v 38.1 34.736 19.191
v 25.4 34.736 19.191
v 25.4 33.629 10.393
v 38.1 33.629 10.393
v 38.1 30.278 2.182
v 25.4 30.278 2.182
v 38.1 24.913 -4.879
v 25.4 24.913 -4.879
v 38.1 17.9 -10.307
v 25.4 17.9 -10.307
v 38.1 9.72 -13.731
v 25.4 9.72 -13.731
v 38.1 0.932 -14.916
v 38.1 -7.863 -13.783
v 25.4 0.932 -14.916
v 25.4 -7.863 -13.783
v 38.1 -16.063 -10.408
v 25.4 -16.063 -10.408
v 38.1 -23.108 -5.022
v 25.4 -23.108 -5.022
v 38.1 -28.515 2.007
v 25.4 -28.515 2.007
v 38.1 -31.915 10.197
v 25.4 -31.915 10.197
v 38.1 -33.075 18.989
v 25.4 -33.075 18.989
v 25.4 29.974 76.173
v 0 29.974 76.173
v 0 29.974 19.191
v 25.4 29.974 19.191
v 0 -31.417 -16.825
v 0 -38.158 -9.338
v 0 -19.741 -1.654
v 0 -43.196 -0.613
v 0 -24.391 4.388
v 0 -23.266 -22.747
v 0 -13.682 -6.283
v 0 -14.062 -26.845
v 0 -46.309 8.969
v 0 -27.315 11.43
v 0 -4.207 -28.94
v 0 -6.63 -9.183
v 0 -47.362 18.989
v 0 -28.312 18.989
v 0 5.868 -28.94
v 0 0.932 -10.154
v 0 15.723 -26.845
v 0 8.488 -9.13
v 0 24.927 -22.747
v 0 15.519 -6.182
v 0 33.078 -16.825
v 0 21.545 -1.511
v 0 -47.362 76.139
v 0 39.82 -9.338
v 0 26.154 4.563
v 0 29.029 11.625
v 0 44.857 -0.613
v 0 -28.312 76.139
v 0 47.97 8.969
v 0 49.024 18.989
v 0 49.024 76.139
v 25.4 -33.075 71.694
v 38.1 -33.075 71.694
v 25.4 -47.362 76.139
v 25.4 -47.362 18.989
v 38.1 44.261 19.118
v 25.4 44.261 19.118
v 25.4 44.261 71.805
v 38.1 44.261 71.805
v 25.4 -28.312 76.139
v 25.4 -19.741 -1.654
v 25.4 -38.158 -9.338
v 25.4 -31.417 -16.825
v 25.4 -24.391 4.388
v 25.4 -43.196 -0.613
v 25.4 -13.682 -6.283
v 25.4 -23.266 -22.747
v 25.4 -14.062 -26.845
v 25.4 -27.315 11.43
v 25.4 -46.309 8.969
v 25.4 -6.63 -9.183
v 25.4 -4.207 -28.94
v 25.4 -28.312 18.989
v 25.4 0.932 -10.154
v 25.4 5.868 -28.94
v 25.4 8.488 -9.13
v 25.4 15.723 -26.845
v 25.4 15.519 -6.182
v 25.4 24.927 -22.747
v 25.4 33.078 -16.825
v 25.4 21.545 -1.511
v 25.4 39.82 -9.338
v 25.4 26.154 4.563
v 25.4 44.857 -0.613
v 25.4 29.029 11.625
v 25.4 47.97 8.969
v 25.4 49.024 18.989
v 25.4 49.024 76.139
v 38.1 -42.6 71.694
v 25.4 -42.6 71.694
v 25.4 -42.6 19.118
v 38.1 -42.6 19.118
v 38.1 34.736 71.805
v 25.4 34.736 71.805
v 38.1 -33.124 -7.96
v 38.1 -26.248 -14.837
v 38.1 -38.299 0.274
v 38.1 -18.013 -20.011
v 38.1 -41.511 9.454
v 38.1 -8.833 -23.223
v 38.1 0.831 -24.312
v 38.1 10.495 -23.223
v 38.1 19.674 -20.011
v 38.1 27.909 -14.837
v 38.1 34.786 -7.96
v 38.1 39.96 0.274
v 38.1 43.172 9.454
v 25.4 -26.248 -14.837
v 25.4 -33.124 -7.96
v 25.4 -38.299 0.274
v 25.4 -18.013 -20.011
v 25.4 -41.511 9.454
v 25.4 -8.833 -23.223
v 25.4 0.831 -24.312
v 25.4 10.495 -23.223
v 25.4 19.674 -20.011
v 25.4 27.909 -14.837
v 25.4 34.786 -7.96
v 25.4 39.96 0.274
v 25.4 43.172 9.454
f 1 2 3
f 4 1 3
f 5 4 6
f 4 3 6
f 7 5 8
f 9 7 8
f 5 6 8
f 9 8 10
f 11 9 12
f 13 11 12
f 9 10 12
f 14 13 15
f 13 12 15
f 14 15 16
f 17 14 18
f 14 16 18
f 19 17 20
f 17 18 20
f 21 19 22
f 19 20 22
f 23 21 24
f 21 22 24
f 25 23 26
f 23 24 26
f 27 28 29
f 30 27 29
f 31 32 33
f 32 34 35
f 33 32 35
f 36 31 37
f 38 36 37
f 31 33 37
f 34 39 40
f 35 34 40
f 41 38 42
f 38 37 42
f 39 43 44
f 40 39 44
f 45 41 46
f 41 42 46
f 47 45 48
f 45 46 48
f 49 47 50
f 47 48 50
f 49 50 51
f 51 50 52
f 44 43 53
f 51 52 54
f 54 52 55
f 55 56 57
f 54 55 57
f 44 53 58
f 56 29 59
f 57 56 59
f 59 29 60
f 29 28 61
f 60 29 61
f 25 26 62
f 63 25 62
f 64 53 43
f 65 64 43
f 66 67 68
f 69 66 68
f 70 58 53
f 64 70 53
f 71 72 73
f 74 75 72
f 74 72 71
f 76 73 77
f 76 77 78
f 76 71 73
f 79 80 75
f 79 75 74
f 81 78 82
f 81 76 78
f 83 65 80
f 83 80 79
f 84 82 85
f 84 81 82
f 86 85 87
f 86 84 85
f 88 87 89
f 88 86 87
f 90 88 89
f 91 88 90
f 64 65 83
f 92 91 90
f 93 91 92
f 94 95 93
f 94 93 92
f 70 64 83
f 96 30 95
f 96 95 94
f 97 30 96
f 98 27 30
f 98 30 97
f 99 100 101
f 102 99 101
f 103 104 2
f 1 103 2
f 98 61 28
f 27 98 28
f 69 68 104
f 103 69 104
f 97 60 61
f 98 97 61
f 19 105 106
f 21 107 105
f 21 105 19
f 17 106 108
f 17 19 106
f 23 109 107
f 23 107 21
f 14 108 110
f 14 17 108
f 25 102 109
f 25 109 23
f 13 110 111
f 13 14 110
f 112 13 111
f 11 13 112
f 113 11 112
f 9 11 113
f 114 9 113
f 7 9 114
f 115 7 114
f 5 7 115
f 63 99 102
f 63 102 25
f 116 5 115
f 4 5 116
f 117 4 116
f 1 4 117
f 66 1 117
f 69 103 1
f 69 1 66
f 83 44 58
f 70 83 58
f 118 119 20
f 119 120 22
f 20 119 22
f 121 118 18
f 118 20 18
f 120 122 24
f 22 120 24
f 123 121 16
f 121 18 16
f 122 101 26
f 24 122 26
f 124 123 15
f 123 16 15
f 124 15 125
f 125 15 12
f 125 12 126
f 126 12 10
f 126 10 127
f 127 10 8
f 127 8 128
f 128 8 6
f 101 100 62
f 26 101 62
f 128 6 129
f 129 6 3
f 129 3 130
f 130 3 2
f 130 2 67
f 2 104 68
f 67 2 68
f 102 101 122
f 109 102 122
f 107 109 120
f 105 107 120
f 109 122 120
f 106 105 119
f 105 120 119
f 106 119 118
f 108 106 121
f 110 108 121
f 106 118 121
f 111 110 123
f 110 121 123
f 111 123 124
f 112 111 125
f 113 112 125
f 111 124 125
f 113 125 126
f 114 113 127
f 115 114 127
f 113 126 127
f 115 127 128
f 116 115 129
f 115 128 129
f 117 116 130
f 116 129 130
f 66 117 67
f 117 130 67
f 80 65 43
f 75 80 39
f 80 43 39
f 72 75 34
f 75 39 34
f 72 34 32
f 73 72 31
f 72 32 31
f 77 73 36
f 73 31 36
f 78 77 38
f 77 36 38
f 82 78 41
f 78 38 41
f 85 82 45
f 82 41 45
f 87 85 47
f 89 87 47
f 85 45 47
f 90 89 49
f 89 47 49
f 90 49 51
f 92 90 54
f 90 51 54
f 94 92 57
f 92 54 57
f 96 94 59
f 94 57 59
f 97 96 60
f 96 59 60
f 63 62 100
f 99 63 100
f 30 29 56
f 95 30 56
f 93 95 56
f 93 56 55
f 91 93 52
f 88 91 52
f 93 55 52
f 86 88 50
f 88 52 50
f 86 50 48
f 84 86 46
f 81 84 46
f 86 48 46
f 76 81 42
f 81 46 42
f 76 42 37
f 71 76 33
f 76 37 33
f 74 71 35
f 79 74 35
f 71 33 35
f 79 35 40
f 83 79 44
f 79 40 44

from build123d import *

# Parameters (mm, degrees)
F1_DEPTH = 25.4
F3_DEPTH = 12.7


# Not quite as in the source:
# - ends of sketch curves that miss each other by under 0.0002 mm in the source are joined


with BuildPart() as f1:
    # F0 (on Right) → F1 (new body)
    with BuildSketch(Plane.YZ):
        with BuildLine():
            Line((-28.3121045191, 76.1390224734), (-47.3621045191, 76.1390224734))
            Line((-47.3621045191, 76.1390224734), (-47.3621045191, 18.9890224734))
            ThreePointArc((-47.3621045191, 18.9890224734), (0.8307135418, -29.2037957052), (49.0235318381, 18.9890222381))
            Line((49.0235318381, 18.9890222381), (49.0235318381, 76.1390222381))
            Line((49.0235318381, 76.1390222381), (29.9735318381, 76.1725883931))
            Line((29.9735318381, 76.1725883931), (29.9735318381, 19.1909559071))
            ThreePointArc((29.9735318381, 19.1909559071), (0.9320306114, -10.1539702583), (-28.3121045191, 18.9890228212))
            Line((-28.3121045191, 18.9890228212), (-28.3121045191, 76.1390224734))
        make_face()
    extrude(amount=F1_DEPTH)


with BuildPart() as f3:
    # F2 (on face) → F3 (new body)
    with BuildSketch(Plane.YZ.offset(25.4)):
        with BuildLine():
            Line((-33.0746045191, 71.6940224734), (-42.5996045191, 71.6940224734))
            Line((-42.5996045191, 71.6940224734), (-42.5996045191, 19.1180334417))
            ThreePointArc((-42.5996045191, 19.1180334417), (0.8307136595, -24.3122847369), (44.2610318381, 19.1180334417))
            Line((44.2610318381, 19.1180334417), (44.2610318381, 71.8052499411))
            Line((44.2610318381, 71.8052499411), (34.7360318381, 71.8052499411))
            Line((34.7360318381, 71.8052499411), (34.7360318381, 19.1909559071))
            ThreePointArc((34.7360318381, 19.1909559071), (0.931981493, -14.9164460393), (-33.0746045191, 18.9890224734))
            Line((-33.0746045191, 18.9890224734), (-33.0746045191, 71.6940224734))
        make_face()
    extrude(amount=F3_DEPTH)


solid = Compound([f1.part, f3.part])
